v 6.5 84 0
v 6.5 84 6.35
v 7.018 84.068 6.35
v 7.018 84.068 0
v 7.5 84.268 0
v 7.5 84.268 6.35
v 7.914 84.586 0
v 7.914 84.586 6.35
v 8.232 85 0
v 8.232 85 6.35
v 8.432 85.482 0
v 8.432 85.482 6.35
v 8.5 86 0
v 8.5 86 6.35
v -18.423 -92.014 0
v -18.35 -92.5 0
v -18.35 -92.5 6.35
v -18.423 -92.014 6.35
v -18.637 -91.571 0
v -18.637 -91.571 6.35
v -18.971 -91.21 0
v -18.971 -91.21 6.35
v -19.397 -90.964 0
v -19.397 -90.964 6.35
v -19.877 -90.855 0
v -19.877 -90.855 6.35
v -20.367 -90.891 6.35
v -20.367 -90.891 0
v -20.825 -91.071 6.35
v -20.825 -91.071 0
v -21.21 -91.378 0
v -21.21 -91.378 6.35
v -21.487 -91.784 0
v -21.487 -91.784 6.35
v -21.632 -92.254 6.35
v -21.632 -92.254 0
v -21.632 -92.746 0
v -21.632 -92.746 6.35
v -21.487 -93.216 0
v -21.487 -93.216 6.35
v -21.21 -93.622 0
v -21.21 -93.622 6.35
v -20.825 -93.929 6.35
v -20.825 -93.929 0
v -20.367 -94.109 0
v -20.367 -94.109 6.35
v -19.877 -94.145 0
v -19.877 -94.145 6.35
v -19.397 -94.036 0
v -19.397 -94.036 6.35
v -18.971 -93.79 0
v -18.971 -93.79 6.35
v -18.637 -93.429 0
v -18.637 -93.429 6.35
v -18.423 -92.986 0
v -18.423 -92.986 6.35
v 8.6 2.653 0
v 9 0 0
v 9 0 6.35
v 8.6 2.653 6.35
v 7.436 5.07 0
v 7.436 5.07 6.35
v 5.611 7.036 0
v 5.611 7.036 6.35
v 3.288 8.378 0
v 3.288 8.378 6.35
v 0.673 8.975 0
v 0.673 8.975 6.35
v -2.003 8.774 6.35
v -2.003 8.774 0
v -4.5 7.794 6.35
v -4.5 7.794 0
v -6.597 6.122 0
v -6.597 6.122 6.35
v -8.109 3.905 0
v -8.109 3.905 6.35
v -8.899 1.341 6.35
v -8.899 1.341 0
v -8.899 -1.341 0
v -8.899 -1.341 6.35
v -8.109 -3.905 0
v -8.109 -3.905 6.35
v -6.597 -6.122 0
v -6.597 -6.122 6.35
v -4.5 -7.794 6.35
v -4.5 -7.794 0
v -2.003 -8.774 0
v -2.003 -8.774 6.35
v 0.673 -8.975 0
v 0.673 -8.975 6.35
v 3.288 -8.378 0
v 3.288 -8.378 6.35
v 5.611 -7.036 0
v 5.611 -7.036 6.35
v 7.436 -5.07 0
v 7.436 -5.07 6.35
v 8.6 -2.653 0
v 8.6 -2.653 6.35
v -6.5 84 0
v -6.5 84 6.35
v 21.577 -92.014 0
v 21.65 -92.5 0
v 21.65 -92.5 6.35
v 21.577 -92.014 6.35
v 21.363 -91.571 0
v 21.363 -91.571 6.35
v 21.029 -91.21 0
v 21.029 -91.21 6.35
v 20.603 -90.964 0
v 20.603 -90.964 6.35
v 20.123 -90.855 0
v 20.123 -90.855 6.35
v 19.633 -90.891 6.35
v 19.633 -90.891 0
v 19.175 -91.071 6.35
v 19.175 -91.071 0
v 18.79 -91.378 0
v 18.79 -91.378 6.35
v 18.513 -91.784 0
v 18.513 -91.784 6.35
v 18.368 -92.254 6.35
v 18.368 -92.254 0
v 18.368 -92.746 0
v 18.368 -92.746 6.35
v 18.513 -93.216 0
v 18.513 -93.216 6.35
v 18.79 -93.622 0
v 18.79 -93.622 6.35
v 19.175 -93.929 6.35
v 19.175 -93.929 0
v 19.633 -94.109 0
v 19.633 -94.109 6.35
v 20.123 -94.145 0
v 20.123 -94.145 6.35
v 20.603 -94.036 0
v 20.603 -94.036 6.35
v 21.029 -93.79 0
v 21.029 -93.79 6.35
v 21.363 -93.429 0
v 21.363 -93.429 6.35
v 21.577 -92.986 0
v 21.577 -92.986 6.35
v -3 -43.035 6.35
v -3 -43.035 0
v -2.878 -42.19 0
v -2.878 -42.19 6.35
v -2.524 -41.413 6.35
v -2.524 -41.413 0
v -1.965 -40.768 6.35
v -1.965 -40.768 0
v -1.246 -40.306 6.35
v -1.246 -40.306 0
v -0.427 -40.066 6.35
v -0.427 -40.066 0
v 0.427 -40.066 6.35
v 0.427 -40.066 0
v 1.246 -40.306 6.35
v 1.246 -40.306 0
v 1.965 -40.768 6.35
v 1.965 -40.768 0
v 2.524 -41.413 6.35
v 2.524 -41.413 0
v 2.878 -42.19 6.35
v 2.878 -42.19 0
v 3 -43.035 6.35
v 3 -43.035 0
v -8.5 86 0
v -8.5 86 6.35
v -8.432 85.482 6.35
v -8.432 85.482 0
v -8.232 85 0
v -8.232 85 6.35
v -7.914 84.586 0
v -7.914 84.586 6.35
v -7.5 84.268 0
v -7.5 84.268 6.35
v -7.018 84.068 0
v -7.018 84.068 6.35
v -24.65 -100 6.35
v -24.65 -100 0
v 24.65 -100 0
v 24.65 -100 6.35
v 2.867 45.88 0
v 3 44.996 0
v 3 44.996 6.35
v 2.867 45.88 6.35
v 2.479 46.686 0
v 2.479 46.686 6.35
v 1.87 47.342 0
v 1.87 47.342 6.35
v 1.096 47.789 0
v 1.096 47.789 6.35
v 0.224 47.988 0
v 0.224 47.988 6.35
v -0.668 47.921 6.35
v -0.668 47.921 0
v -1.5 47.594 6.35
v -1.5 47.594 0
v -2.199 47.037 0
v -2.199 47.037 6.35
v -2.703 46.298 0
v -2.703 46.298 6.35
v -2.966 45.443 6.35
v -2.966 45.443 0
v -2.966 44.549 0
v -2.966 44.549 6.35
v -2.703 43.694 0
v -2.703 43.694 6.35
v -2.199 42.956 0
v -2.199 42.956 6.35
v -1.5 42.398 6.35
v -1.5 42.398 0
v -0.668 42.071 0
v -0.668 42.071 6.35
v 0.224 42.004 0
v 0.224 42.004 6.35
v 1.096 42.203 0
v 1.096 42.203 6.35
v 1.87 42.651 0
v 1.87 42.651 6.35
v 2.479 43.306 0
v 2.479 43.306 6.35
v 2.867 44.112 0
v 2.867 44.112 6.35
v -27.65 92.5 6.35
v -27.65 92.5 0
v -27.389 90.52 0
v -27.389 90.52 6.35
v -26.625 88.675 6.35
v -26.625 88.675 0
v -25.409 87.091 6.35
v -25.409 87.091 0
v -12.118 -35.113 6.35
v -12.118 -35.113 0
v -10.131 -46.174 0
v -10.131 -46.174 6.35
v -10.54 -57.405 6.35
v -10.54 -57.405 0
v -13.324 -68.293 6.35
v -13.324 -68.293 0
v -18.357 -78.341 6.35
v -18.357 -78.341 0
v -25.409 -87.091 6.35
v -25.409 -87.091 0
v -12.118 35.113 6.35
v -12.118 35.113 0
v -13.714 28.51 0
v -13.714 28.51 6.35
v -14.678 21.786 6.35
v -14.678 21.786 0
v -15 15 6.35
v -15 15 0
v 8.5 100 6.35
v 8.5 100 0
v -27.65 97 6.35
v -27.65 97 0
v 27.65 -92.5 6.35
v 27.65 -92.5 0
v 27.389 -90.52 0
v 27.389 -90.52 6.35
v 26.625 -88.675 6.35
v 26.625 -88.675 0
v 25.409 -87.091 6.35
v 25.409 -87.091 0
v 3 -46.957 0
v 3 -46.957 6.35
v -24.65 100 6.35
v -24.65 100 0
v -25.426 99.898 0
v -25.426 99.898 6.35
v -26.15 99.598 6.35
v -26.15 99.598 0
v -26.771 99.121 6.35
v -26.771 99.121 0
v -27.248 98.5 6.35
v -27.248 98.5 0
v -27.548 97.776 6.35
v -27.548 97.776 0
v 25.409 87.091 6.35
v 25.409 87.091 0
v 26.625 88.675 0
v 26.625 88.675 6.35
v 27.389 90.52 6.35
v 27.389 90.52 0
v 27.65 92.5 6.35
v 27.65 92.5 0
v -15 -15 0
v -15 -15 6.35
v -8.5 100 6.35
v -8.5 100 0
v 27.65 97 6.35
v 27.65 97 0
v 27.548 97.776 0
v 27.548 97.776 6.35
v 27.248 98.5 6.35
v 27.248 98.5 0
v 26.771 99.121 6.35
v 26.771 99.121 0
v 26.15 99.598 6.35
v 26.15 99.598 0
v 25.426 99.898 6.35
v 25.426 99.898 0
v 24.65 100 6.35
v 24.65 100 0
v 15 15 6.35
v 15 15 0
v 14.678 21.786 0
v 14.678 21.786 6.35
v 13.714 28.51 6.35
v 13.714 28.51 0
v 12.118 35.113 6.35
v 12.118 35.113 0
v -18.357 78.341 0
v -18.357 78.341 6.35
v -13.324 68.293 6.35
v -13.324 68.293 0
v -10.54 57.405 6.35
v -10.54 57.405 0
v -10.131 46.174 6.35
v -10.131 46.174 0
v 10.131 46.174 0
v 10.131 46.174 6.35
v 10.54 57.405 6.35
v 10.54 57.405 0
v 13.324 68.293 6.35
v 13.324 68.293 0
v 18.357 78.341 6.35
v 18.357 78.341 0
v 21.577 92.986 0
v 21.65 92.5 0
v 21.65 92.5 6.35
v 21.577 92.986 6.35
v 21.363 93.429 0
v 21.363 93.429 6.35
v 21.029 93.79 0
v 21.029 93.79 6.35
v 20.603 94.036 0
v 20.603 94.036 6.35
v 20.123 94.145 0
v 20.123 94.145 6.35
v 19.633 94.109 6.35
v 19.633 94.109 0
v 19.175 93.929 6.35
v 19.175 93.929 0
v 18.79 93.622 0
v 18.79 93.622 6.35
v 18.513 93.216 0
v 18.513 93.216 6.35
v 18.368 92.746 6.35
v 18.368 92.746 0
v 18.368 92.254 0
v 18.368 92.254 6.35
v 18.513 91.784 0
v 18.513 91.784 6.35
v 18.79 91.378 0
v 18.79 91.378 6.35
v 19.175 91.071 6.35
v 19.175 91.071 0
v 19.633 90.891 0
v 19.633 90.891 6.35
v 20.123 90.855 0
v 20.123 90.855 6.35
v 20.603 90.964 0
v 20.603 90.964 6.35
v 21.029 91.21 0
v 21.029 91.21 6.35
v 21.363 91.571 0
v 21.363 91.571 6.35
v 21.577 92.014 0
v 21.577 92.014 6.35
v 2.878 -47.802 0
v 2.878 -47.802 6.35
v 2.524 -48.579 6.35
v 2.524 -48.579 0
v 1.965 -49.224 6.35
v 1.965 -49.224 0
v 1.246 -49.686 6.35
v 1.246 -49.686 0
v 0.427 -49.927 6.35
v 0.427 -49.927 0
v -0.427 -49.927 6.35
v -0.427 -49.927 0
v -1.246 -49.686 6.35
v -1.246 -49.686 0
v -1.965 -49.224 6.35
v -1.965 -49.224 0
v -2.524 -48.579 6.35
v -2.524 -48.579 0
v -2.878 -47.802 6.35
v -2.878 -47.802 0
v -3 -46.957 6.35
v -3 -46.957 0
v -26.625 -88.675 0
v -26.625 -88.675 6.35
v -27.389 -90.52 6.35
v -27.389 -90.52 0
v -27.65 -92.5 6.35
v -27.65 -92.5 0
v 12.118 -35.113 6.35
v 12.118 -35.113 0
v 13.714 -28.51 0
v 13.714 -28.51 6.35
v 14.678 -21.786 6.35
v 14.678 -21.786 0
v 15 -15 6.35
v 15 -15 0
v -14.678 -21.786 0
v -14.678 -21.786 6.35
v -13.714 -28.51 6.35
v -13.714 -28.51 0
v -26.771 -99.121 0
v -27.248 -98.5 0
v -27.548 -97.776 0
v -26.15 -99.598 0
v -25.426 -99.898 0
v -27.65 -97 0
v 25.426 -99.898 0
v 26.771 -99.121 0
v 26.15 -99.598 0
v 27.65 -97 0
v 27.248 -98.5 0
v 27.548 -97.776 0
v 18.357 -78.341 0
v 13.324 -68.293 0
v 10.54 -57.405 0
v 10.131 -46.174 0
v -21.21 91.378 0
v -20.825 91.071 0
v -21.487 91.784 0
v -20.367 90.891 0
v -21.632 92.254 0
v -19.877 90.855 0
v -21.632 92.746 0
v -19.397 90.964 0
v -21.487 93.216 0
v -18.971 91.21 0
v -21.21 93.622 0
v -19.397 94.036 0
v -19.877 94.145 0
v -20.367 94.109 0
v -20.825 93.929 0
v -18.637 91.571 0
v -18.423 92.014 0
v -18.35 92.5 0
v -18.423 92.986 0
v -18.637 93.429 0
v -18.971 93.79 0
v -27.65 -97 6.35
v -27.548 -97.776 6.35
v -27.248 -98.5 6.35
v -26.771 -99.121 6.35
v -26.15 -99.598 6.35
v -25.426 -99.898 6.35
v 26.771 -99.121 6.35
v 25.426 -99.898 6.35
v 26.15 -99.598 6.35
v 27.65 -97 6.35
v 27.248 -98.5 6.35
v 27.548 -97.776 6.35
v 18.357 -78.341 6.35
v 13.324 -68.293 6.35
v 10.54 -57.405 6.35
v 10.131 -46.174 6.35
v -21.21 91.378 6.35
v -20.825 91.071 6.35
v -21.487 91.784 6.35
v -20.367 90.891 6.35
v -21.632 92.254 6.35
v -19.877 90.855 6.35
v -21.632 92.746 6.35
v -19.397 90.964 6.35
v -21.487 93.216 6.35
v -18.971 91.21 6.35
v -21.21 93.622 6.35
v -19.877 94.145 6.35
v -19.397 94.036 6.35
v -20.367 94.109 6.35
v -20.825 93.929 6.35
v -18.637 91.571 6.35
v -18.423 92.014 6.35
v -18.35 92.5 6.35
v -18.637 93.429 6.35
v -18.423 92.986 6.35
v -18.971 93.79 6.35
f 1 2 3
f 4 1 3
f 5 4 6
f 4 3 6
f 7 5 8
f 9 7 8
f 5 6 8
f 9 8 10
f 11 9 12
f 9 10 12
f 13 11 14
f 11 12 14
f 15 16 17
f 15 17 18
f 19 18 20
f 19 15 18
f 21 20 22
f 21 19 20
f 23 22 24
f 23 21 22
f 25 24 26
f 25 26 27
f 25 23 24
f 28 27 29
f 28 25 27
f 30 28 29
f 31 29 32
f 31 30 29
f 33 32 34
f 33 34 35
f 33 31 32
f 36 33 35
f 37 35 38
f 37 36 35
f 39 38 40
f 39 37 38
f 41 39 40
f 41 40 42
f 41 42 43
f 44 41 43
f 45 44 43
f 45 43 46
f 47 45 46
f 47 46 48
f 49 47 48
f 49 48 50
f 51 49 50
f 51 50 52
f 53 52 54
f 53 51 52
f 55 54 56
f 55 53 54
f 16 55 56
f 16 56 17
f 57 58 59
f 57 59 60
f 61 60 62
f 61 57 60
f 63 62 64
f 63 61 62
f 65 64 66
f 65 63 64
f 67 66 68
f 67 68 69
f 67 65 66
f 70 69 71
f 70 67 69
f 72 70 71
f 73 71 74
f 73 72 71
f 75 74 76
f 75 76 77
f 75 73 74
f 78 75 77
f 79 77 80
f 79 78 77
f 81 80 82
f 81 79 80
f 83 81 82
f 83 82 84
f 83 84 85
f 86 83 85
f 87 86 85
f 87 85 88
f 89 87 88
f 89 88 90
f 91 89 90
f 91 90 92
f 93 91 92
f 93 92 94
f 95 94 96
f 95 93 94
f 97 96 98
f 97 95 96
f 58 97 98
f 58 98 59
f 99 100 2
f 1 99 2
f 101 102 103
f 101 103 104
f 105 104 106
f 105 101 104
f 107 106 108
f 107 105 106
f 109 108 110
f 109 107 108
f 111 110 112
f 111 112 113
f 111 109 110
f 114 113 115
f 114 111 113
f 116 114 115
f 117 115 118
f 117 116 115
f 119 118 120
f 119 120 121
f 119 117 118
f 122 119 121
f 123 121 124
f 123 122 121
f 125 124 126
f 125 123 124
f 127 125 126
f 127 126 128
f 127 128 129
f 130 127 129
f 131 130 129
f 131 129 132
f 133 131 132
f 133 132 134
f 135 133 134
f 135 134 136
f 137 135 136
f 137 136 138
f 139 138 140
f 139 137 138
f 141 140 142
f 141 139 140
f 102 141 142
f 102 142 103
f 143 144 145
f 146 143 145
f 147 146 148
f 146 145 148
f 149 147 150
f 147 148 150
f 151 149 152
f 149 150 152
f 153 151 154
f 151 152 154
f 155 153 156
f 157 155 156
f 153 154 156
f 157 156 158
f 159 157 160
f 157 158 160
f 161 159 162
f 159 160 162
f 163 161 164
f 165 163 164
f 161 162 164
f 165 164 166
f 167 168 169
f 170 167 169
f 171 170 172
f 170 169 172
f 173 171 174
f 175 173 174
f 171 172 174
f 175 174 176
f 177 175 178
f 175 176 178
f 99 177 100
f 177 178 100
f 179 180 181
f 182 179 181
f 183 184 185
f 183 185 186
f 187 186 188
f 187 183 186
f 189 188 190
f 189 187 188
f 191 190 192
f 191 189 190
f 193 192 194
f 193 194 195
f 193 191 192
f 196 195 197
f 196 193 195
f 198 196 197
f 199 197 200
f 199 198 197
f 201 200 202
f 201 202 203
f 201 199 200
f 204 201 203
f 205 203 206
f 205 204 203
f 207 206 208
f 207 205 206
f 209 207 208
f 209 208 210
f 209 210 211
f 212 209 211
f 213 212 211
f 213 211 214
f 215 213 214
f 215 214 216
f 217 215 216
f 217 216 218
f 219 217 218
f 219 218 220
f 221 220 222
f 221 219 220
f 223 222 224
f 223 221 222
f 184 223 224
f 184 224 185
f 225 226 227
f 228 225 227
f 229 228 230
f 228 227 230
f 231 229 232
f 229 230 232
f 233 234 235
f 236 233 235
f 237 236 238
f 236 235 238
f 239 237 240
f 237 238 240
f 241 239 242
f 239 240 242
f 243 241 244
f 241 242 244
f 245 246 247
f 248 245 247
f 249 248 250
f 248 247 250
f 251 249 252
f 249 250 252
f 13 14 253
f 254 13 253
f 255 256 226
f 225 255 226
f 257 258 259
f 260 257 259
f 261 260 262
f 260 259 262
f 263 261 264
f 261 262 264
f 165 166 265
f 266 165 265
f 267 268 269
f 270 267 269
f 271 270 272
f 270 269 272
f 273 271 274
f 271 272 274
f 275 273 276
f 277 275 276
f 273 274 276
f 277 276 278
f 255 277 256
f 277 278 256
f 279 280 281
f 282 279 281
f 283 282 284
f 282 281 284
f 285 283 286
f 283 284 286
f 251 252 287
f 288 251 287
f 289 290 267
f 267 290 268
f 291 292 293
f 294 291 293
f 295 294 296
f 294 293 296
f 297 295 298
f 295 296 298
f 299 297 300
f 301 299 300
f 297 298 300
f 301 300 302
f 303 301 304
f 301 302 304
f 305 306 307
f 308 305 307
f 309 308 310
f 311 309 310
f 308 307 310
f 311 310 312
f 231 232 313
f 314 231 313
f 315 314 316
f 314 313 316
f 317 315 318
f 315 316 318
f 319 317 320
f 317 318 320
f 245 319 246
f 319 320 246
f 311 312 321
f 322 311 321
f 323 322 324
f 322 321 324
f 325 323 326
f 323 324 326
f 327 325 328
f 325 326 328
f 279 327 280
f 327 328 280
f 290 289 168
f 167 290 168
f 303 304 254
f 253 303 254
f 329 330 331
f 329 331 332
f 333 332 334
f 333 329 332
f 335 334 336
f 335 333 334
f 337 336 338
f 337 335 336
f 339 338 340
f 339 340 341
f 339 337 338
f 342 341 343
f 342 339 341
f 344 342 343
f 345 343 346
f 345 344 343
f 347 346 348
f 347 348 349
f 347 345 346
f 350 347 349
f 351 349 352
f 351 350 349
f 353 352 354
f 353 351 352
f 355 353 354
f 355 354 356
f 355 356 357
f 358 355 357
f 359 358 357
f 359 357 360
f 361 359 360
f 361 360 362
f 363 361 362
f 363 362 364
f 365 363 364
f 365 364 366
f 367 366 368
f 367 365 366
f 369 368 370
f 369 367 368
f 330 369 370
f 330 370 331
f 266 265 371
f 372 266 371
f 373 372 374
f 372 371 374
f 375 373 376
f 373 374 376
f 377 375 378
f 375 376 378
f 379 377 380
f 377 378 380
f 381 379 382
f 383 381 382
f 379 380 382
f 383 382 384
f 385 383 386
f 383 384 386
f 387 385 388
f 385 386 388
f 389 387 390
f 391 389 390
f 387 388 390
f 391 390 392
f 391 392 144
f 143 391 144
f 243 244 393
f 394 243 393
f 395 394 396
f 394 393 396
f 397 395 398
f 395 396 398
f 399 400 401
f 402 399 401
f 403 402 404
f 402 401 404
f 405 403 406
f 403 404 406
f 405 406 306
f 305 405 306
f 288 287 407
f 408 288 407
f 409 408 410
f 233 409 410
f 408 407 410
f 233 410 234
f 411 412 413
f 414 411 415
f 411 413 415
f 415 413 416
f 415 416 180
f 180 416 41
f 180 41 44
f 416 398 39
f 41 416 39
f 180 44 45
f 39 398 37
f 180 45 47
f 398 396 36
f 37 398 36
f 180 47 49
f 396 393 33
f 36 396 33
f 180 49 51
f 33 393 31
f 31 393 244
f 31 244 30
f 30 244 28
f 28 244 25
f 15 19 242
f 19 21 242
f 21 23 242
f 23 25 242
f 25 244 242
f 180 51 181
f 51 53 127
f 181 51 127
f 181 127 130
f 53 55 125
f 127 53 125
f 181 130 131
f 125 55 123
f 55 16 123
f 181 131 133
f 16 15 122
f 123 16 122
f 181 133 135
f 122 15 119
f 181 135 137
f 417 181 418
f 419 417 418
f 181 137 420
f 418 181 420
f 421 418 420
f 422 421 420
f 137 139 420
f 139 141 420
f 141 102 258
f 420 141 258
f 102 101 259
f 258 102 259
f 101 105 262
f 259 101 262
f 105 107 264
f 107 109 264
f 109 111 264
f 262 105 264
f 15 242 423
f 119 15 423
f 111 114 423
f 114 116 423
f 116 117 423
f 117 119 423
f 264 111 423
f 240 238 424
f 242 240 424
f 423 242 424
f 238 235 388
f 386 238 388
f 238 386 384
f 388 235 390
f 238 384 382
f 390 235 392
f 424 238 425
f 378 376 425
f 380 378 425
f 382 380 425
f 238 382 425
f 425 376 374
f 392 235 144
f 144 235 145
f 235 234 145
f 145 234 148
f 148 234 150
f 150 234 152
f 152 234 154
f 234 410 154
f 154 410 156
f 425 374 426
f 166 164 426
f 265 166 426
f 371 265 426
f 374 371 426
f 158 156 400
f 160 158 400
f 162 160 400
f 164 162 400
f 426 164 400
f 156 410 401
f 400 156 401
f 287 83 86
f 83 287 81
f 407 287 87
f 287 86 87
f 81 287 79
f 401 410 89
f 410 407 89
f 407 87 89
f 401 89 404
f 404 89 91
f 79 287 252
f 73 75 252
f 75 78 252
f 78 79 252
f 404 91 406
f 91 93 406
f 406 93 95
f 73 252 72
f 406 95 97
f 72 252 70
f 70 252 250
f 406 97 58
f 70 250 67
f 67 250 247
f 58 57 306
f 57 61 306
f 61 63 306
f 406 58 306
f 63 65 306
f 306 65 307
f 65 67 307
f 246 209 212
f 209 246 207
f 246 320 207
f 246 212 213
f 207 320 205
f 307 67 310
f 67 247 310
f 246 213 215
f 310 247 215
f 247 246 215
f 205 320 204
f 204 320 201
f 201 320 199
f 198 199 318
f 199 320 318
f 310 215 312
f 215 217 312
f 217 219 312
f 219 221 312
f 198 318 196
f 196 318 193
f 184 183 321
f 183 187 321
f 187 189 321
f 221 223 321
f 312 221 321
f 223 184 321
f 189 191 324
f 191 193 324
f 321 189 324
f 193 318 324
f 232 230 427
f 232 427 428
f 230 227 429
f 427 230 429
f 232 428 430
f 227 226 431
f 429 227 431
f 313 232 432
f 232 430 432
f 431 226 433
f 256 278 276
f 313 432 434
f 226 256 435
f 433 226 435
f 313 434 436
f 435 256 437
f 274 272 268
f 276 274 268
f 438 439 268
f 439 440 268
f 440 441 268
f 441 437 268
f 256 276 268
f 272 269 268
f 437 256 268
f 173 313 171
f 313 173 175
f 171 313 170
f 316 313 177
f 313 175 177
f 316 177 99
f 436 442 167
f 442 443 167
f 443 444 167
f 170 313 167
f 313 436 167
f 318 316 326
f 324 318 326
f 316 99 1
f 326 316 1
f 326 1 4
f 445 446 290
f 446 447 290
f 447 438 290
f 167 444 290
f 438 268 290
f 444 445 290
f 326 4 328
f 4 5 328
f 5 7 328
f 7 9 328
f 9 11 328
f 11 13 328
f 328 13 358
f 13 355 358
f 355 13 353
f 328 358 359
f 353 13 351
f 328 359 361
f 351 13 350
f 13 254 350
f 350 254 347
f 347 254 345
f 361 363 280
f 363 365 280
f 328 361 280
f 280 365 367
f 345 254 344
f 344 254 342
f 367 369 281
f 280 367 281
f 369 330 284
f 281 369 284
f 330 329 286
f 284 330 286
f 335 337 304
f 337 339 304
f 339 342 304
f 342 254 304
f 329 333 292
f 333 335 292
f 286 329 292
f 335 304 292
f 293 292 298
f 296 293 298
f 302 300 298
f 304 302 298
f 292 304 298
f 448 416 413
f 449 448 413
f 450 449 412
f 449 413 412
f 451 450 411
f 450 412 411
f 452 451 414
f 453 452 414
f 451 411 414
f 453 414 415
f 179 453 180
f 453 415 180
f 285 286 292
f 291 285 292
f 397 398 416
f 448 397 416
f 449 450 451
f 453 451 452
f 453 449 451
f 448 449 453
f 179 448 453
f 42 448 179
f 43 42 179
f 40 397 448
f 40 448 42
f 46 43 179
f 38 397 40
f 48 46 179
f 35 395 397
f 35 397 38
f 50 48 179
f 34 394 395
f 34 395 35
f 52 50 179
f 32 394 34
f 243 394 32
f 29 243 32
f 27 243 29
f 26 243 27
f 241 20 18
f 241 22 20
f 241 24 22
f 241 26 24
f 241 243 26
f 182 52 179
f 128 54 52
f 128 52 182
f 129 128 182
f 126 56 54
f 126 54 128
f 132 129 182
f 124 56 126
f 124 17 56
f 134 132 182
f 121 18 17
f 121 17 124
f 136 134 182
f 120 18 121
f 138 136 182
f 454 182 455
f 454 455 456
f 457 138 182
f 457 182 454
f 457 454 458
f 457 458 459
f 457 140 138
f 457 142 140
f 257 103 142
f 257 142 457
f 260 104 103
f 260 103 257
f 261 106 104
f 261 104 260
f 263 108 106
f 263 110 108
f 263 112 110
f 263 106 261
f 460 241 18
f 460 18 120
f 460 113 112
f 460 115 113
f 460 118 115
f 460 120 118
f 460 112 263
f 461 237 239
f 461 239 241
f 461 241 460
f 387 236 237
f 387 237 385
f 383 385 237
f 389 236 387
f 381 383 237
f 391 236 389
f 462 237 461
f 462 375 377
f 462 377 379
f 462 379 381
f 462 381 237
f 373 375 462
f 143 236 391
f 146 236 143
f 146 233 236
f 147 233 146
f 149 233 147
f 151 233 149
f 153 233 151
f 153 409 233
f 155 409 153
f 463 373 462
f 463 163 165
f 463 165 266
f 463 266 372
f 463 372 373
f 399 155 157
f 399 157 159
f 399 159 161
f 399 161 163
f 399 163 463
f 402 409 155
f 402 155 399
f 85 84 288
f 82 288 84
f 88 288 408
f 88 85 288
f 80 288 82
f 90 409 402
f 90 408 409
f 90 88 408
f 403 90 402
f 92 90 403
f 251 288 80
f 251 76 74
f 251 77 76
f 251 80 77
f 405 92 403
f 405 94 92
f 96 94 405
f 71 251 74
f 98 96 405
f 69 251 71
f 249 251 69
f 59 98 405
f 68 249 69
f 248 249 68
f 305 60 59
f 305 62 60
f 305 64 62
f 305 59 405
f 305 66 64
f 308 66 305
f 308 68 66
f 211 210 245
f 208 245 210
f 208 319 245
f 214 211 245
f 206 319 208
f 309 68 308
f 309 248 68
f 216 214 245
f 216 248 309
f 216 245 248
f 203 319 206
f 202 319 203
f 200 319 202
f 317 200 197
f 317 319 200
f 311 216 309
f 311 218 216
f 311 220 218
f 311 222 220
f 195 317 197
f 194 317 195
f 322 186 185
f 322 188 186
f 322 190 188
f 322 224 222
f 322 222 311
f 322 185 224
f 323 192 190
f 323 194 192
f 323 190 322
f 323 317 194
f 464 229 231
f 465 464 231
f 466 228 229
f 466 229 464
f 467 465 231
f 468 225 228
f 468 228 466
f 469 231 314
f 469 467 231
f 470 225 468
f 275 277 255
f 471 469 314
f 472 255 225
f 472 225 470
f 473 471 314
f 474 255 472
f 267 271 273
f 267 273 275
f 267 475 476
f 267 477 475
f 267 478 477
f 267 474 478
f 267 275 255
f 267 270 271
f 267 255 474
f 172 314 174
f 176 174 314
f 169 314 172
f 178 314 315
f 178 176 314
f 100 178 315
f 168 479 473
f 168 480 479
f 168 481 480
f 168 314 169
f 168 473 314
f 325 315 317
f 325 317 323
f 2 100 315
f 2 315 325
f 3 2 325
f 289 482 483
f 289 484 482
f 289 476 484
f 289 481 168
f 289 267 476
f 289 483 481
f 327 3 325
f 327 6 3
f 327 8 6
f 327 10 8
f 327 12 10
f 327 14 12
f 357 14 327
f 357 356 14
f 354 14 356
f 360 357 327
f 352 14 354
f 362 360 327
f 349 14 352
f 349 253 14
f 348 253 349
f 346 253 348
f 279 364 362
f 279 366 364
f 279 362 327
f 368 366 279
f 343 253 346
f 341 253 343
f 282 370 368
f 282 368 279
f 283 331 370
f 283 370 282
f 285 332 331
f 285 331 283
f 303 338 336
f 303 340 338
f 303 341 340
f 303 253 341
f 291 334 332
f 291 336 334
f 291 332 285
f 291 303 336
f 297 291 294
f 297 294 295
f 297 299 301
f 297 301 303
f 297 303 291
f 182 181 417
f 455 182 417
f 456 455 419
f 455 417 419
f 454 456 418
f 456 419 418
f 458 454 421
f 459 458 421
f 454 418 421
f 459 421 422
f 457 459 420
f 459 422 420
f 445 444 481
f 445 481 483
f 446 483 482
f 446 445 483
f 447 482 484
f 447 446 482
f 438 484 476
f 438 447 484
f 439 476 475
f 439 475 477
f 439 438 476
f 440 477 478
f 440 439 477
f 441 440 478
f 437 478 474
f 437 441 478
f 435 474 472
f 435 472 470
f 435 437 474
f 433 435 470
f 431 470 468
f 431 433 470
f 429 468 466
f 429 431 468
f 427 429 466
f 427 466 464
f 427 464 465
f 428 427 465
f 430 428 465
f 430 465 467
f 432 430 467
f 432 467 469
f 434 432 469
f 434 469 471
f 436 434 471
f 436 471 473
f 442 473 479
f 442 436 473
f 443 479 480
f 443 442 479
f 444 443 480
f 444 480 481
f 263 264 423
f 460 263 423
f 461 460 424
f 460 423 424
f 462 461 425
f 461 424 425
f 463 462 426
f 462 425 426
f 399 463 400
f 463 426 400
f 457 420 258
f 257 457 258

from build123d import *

# Parameters (mm, degrees)
SKETCH1_R           = 9
SKETCH1_R_2         = 3
SKETCH1_R_3         = 1.65
BOSS_EXTRUDE1_DEPTH = 6.35
CUT_EXTRUDE1_DEPTH  = 10


with BuildPart() as part:
    # Sketch1 → Boss-Extrude1 (new body)
    with BuildSketch(Plane.XY):
        with BuildLine():
            Line((-15, 15), (-15, -15))
            ThreePointArc((-15, -15), (-14.275727836, -25.159324804), (-12.117561222, -35.113156605))
            ThreePointArc((-12.117561222, -35.113156605), (-11.640196728, -62.923473964), (-25.409366876, -87.090633124))
            ThreePointArc((-25.409366876, -87.090633124), (-27.067678424, -89.572471742), (-27.65, -92.5))
            Line((-27.65, -92.5), (-27.65, -97))
            ThreePointArc((-27.65, -97), (-26.771320344, -99.121320344), (-24.65, -100))
            Line((-24.65, -100), (24.65, -100))
            ThreePointArc((24.65, -100), (26.771320344, -99.121320344), (27.65, -97))
            Line((27.65, -97), (27.65, -92.5))
            ThreePointArc((27.65, -92.5), (27.067678424, -89.572471742), (25.409366876, -87.090633124))
            ThreePointArc((25.409366876, -87.090633124), (11.640196728, -62.923473964), (12.117561222, -35.113156605))
            ThreePointArc((12.117561222, -35.113156605), (14.275727836, -25.159324804), (15, -15))
            Line((15, -15), (15, 15))
            ThreePointArc((15, 15), (14.275727836, 25.159324804), (12.117561222, 35.113156605))
            ThreePointArc((12.117561222, 35.113156605), (11.640196728, 62.923473964), (25.409366876, 87.090633124))
            ThreePointArc((25.409366876, 87.090633124), (27.067678424, 89.572471742), (27.65, 92.5))
            Line((27.65, 92.5), (27.65, 97))
            ThreePointArc((27.65, 97), (26.771320344, 99.121320344), (24.65, 100))
            Line((24.65, 100), (-24.65, 100))
            ThreePointArc((-24.65, 100), (-26.771320344, 99.121320344), (-27.65, 97))
            Line((-27.65, 97), (-27.65, 92.5))
            ThreePointArc((-27.65, 92.5), (-27.067678424, 89.572471742), (-25.409366876, 87.090633124))
            ThreePointArc((-25.409366876, 87.090633124), (-11.640196728, 62.923473964), (-12.117561222, 35.113156605))
            ThreePointArc((-12.117561222, 35.113156605), (-14.275727836, 25.159324804), (-15, 15))
        make_face()
        Circle(SKETCH1_R, mode=Mode.SUBTRACT)
        with Locations((0, 44.9961)):
            Circle(SKETCH1_R_2, mode=Mode.SUBTRACT)
        with Locations((20, 92.5)):
            Circle(SKETCH1_R_3, mode=Mode.SUBTRACT)
        with Locations((-20, 92.5)):
            Circle(SKETCH1_R_3, mode=Mode.SUBTRACT)
        with Locations((-20, -92.5)):
            Circle(SKETCH1_R_3, mode=Mode.SUBTRACT)
        with Locations((20, -92.5)):
            Circle(SKETCH1_R_3, mode=Mode.SUBTRACT)
        with BuildLine():
            Line((3, -43.0351625), (3, -46.9570375))
            ThreePointArc((3, -46.9570375), (0, -49.9570375), (-3, -46.9570375))
            Line((-3, -46.9570375), (-3, -43.0351625))
            ThreePointArc((-3, -43.0351625), (0, -40.0351625), (3, -43.0351625))
        make_face(mode=Mode.SUBTRACT)
    extrude(amount=BOSS_EXTRUDE1_DEPTH)

    # Sketch3 → Cut-Extrude1 (cut)
    with BuildSketch(Plane.XY.offset(6.35)):
        with BuildLine():
            Line((-8.5, 101), (-8.5, 86))
            ThreePointArc((-8.5, 86), (-7.914213562, 84.585786438), (-6.5, 84))
            Line((-6.5, 84), (6.5, 84))
            ThreePointArc((6.5, 84), (7.914213562, 84.585786438), (8.5, 86))
            Line((8.5, 86), (8.5, 101))
            Line((8.5, 101), (-8.5, 101))
        make_face()
    extrude(amount=-CUT_EXTRUDE1_DEPTH, mode=Mode.SUBTRACT)


solid = part.part
